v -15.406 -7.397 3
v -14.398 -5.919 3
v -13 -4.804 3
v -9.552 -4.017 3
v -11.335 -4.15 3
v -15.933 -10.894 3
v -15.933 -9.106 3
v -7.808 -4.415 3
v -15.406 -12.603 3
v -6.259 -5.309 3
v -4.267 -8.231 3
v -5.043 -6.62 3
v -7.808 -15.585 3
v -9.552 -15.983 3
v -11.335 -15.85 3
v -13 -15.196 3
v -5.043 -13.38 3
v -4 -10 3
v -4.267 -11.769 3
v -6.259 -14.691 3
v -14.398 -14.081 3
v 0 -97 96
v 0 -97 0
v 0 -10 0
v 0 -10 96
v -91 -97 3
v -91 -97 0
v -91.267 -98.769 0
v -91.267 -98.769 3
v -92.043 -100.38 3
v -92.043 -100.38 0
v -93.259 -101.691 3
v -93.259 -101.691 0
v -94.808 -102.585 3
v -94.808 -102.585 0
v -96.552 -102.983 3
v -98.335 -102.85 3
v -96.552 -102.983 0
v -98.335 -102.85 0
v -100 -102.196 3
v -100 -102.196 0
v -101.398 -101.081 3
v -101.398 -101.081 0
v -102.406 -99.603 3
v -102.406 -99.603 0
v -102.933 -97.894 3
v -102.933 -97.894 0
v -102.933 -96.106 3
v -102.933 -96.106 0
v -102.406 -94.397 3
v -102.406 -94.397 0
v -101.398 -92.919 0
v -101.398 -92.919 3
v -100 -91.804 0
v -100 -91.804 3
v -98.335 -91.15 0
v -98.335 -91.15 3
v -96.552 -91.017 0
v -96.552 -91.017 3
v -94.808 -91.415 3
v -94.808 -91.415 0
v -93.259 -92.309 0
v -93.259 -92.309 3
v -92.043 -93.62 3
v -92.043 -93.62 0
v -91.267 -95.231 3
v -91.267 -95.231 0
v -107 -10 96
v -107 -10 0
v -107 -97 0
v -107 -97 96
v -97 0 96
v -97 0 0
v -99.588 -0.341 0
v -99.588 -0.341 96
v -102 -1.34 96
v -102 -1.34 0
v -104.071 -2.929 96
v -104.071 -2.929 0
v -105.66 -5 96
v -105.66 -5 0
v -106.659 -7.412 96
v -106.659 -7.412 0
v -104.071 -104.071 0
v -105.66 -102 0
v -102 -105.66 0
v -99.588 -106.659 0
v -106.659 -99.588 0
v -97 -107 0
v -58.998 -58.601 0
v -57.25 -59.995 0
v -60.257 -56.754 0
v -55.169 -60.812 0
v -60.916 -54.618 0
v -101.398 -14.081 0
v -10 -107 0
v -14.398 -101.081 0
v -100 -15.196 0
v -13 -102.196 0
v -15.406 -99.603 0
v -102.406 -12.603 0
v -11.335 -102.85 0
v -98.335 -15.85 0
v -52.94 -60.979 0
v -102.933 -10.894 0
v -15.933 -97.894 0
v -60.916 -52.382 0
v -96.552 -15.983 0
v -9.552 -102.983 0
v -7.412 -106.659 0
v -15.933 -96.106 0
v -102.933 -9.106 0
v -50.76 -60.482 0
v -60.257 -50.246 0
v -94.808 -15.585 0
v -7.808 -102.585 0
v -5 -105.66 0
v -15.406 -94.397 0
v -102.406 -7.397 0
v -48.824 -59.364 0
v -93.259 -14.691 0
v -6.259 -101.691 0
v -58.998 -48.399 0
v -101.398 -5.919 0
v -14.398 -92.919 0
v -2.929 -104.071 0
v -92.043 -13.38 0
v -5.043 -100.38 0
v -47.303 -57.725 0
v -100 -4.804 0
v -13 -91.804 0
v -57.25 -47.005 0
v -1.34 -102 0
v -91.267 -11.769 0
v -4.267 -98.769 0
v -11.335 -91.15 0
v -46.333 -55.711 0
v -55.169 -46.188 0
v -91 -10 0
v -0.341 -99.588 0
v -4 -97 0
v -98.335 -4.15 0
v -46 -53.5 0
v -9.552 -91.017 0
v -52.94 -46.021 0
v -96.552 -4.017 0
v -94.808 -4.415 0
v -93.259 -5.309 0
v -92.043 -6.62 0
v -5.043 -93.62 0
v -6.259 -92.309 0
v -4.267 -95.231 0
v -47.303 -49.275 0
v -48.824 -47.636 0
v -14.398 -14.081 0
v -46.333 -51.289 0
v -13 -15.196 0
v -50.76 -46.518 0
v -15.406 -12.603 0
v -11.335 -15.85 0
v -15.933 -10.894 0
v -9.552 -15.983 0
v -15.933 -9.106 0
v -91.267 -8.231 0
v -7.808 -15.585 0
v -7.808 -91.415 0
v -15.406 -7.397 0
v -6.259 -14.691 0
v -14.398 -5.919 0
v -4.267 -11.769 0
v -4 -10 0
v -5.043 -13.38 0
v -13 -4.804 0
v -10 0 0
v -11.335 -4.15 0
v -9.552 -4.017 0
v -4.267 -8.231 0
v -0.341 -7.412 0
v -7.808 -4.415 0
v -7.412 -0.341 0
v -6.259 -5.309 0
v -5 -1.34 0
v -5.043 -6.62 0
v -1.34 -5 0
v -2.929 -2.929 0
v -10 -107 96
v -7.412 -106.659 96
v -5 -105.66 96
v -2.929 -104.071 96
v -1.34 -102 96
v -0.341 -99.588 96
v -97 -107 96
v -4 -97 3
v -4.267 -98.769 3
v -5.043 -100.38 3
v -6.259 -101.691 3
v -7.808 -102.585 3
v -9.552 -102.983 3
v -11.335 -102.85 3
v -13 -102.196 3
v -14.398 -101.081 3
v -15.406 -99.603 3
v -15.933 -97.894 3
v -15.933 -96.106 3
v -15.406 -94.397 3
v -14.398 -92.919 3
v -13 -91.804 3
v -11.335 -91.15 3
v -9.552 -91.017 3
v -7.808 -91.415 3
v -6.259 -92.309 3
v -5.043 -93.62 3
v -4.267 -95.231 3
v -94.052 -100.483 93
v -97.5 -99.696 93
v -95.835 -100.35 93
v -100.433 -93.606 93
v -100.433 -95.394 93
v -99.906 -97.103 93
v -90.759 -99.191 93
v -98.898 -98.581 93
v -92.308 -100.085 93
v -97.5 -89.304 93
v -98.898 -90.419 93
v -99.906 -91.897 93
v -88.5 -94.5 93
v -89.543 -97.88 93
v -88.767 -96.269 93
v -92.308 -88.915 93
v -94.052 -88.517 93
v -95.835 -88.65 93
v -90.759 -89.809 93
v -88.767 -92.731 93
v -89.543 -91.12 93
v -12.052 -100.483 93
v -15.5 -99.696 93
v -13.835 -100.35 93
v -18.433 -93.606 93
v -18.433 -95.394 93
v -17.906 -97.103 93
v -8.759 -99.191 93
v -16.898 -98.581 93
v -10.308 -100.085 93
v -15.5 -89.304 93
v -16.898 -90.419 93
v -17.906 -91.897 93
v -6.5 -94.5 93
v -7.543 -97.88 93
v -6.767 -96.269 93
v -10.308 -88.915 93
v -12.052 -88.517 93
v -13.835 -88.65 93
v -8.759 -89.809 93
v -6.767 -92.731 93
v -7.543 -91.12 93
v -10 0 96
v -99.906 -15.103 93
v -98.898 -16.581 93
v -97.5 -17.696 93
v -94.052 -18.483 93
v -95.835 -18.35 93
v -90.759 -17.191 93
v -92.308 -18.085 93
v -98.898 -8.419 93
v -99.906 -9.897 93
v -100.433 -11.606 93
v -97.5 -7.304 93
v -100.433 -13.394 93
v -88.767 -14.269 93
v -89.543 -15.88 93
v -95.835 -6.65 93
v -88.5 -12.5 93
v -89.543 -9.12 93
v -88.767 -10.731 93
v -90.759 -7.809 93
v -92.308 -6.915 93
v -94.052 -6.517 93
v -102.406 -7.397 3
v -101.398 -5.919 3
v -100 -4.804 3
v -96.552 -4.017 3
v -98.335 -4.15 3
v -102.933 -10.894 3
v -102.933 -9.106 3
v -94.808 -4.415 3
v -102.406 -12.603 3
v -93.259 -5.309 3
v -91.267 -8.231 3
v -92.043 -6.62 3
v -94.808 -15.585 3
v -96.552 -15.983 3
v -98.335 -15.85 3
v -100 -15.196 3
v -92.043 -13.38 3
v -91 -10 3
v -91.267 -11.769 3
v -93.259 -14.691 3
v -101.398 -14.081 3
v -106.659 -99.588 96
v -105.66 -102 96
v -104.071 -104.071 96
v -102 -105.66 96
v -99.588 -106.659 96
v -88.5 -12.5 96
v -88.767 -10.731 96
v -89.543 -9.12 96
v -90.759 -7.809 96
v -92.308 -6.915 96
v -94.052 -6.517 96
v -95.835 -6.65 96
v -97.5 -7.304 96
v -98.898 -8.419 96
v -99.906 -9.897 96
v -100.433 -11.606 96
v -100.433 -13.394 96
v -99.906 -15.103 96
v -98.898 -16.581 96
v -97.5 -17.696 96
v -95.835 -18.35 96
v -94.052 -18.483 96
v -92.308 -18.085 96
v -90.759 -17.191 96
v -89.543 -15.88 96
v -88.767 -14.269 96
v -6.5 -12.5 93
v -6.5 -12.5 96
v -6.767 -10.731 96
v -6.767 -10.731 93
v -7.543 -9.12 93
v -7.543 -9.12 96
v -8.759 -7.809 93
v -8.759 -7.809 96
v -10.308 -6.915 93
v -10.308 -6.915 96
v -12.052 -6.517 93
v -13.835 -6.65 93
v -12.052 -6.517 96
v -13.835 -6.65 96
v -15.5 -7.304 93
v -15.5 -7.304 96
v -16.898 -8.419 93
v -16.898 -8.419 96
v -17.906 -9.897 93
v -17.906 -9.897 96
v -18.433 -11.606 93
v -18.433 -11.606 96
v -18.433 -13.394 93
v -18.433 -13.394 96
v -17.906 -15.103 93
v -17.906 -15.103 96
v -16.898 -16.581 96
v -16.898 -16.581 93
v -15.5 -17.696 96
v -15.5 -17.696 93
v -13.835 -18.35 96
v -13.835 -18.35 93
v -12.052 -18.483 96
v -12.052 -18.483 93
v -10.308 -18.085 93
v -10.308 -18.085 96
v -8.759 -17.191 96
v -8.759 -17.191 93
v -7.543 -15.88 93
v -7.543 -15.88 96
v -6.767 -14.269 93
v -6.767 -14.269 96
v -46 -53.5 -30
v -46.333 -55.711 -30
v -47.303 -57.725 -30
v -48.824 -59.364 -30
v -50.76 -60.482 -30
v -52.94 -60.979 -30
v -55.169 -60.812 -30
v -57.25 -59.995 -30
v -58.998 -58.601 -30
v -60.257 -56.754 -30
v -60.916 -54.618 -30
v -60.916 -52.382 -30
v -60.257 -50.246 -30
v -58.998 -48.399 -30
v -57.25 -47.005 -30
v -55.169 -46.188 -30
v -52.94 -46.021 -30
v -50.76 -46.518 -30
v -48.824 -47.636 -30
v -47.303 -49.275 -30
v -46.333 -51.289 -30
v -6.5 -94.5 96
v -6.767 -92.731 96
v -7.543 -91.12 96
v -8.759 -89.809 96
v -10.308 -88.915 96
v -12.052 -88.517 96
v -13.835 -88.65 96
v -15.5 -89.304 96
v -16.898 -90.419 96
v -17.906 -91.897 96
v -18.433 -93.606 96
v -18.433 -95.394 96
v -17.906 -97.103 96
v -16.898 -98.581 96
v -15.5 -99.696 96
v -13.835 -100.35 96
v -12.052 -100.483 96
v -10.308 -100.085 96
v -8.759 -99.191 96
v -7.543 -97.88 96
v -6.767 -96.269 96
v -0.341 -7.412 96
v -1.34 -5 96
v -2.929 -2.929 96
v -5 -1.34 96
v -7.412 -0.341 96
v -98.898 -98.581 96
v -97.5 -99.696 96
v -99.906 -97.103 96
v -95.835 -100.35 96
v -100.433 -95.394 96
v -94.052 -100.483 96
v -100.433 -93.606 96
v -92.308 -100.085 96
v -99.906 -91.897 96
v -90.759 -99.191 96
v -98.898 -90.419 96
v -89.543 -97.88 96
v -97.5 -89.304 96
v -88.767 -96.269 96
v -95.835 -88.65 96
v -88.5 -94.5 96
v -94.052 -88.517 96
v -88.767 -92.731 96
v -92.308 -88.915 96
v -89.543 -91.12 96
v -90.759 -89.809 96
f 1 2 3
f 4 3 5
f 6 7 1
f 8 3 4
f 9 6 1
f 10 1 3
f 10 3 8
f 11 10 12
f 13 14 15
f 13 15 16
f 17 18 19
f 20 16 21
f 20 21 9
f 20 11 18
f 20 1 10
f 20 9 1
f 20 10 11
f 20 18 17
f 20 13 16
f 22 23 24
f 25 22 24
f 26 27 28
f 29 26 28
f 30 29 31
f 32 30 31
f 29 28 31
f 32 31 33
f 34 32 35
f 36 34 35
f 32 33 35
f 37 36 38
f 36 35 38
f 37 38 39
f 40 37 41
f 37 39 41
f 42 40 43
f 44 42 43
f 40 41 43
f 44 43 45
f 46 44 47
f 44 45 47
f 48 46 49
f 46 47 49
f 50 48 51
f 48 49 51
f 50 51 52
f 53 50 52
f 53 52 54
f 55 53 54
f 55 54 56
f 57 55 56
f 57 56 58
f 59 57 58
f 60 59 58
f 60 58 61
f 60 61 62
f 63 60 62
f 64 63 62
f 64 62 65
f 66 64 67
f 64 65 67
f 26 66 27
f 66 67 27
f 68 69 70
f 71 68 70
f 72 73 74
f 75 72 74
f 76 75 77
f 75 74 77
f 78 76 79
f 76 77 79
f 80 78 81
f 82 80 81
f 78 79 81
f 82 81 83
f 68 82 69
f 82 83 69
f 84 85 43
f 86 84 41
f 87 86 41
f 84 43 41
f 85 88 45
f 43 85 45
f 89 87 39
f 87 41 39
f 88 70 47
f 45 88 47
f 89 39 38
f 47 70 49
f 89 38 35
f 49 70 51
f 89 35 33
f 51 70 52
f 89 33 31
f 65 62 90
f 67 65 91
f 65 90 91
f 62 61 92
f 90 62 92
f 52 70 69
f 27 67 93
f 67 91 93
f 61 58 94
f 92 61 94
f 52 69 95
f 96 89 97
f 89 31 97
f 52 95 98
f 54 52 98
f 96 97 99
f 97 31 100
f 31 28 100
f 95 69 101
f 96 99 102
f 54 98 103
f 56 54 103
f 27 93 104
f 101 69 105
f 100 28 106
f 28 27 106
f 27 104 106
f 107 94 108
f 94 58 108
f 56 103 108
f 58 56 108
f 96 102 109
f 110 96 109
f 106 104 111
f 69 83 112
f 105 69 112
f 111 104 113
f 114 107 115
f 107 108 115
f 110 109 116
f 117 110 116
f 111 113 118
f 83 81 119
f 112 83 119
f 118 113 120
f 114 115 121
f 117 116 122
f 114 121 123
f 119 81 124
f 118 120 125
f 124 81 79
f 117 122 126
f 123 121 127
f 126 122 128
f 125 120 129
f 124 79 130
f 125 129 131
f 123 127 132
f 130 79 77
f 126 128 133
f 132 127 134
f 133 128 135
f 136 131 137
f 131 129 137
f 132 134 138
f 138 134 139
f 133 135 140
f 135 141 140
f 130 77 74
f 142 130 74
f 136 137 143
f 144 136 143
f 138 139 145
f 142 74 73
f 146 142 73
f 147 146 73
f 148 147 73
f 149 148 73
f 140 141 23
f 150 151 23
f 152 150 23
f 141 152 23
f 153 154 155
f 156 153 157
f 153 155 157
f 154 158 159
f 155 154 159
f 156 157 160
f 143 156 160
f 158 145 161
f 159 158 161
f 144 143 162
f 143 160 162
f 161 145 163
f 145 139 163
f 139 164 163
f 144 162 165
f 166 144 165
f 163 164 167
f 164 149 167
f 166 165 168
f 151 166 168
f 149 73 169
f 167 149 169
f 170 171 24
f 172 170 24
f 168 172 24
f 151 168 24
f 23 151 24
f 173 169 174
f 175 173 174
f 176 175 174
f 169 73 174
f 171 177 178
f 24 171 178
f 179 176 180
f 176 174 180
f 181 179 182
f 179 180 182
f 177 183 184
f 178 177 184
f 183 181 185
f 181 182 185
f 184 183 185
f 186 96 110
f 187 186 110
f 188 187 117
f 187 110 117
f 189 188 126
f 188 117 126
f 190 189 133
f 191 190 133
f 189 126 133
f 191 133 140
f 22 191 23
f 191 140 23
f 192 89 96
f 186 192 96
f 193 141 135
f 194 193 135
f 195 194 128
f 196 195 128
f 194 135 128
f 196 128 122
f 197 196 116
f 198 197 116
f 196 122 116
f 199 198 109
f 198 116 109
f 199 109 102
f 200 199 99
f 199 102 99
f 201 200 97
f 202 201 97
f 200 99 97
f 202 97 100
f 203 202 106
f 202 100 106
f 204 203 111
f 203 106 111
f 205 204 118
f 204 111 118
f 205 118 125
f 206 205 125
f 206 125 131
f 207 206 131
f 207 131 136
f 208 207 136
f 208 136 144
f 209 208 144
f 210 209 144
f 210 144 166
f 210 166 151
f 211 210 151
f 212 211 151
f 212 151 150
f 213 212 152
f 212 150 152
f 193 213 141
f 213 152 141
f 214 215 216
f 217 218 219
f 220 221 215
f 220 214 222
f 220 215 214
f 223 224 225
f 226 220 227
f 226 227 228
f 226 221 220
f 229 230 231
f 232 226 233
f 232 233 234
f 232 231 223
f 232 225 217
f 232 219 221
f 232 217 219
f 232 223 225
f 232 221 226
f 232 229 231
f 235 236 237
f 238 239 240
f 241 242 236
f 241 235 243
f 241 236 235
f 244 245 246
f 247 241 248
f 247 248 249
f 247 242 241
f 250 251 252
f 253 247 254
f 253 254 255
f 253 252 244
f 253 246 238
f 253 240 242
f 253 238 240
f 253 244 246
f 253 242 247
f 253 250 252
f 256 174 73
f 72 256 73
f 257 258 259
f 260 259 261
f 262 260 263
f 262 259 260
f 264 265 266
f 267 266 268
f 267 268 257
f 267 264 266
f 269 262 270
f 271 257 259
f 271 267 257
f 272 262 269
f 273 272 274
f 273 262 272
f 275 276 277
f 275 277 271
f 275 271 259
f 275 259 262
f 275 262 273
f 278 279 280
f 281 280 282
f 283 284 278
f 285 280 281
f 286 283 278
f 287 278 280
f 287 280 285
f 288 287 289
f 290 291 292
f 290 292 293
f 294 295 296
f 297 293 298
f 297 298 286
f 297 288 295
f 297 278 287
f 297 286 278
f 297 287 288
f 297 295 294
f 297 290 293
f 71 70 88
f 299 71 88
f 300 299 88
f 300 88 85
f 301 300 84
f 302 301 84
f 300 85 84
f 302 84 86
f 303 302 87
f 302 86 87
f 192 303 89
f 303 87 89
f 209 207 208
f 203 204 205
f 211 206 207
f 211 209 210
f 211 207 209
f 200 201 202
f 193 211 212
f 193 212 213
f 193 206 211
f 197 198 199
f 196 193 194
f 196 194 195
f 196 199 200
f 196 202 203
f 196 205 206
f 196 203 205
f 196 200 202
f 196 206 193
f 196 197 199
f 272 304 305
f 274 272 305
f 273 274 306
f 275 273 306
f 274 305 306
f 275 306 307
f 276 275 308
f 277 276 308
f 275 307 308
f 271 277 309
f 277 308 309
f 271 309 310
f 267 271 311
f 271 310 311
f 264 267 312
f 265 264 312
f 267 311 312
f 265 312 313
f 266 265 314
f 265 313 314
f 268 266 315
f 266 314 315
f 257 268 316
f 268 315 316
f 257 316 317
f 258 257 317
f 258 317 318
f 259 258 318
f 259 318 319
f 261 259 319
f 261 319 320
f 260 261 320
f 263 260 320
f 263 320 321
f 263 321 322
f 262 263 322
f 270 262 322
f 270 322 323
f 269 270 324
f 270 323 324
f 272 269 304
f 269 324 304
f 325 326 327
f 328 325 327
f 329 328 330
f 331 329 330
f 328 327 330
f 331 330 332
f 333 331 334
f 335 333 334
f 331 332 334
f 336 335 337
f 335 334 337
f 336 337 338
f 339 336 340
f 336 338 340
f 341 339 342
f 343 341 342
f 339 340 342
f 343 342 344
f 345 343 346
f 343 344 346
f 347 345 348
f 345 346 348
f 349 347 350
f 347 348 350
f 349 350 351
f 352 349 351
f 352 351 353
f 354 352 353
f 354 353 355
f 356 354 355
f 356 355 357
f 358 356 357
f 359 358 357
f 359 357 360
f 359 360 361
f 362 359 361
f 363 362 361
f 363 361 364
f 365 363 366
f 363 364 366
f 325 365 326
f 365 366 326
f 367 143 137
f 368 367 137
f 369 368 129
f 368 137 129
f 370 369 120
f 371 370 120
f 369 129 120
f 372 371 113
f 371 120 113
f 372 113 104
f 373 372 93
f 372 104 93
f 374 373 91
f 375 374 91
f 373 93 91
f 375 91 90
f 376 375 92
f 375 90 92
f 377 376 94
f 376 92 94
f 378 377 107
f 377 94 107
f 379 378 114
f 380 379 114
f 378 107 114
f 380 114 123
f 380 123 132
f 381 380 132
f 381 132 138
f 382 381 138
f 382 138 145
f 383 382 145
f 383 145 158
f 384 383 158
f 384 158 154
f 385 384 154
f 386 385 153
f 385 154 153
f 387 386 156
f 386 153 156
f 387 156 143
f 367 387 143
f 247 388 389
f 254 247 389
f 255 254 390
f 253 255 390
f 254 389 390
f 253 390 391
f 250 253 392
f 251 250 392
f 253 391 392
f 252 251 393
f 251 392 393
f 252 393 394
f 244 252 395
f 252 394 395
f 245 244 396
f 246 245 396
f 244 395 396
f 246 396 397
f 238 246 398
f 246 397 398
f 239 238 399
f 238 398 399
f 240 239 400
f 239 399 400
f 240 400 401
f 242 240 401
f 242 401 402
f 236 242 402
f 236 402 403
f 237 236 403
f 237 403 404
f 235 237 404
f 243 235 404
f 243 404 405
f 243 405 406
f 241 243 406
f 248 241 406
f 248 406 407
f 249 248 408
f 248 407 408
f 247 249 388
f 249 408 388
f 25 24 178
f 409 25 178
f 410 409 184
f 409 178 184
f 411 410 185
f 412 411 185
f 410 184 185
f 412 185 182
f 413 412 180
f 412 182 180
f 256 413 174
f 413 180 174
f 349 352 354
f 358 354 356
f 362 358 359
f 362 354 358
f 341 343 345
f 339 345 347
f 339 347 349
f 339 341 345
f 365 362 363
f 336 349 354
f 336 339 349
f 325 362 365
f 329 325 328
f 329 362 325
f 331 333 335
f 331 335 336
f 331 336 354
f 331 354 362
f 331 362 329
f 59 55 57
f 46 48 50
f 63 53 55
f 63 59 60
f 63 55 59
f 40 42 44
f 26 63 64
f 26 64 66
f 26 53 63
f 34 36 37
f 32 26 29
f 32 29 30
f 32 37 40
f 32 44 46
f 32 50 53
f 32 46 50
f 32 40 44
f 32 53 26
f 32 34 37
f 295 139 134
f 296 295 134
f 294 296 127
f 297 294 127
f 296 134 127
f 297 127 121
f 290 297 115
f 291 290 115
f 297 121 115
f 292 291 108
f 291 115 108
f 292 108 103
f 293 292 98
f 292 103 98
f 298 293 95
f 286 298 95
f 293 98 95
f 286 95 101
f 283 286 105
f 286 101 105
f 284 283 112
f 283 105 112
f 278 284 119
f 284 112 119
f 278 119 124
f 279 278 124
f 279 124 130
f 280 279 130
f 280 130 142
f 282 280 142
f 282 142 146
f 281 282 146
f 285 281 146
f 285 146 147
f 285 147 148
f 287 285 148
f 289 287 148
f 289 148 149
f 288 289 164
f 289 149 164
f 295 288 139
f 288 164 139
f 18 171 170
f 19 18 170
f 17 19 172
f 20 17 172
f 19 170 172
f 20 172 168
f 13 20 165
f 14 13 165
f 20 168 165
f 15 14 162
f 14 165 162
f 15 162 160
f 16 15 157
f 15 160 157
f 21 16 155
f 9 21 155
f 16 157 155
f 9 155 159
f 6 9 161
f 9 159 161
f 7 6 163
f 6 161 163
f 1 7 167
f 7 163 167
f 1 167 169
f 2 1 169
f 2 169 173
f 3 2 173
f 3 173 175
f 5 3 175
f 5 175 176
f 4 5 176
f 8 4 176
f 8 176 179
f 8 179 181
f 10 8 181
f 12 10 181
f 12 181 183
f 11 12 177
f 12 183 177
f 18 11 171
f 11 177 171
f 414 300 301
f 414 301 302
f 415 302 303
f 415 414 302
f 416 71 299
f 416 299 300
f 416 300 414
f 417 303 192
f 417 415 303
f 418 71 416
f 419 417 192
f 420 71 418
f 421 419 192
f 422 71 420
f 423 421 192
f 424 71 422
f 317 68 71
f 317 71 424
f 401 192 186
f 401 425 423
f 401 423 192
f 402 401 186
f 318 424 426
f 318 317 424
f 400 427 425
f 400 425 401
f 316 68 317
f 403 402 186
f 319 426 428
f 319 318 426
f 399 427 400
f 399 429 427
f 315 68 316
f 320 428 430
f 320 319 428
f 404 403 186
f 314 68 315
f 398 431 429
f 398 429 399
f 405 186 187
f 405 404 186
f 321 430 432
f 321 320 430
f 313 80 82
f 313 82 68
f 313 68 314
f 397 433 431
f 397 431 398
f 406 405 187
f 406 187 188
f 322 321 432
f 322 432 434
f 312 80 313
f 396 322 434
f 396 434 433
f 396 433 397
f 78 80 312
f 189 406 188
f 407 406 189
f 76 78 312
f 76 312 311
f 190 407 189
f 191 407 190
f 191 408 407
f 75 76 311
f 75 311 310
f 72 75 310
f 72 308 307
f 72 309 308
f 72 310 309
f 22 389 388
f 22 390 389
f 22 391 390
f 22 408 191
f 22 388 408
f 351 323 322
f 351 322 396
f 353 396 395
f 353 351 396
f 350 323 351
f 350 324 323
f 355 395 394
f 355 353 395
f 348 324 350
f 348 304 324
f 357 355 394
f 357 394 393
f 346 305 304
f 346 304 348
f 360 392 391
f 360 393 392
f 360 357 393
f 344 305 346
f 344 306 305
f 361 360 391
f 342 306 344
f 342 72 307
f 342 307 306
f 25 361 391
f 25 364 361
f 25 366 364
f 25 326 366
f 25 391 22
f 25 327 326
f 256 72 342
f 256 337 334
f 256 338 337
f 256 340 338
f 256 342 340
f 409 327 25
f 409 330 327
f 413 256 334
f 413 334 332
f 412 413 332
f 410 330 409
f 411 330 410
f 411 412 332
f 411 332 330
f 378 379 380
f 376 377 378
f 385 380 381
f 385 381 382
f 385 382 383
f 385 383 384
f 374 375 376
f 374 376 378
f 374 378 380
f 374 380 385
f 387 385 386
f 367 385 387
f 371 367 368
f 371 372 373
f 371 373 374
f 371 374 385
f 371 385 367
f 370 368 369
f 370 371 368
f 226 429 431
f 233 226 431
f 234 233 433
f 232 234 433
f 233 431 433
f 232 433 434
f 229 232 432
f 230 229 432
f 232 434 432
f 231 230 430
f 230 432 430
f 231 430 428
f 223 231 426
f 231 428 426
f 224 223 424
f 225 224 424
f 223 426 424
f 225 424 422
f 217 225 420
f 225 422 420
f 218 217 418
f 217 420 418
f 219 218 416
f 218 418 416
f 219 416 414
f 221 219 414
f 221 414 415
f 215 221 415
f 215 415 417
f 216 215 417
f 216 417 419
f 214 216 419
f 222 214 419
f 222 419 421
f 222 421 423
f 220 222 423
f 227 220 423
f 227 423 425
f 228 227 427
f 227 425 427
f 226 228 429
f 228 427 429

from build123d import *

# Parameters (mm, degrees)
F1_DEPTH = 96
F2_R     = 7.5
F3_DEPTH = 30
F4_R     = 6
F5_DEPTH = 3
F6_R     = 6
F7_DEPTH = 3


with BuildPart() as f1:
    # F0 (on Top) → F1 (new body)
    with BuildSketch(Plane.XY):
        with BuildLine():
            ThreePointArc((0, -10), (-2.928932, -2.928932), (-10, 0))
            Line((-10, 0), (-97, 0))
            ThreePointArc((-97, 0), (-104.071068, -2.928932), (-107, -10))
            Line((-107, -10), (-107, -97))
            ThreePointArc((-107, -97), (-104.071068, -104.071068), (-97, -107))
            Line((-97, -107), (-10, -107))
            ThreePointArc((-10, -107), (-2.928932, -104.071068), (0, -97))
            Line((0, -97), (0, -10))
        make_face()
    extrude(amount=F1_DEPTH)

    # F2 (on face) → F3 (join)
    with BuildSketch(Plane(origin=(0, 0, 0), x_dir=(1, 0, 0), z_dir=(0, 0, -1))):
        with Locations((-53.5, 53.5)):
            Circle(F2_R)
    extrude(amount=F3_DEPTH)

    # F4 (on face) → F5 (cut)
    with BuildSketch(Plane.XY.offset(96)):
        with Locations((-94.5, -94.5)):
            Circle(F4_R)
        with Locations((-94.5, -12.5)):
            Circle(F4_R)
        with Locations((-12.5, -94.5)):
            Circle(F4_R)
        with Locations((-12.5, -12.5)):
            Circle(F4_R)
    extrude(amount=-F5_DEPTH, mode=Mode.SUBTRACT)

    # F6 (on face) → F7 (cut)
    with BuildSketch(Plane(origin=(0, 0, 0), x_dir=(1, 0, 0), z_dir=(0, 0, -1))):
        with Locations((-10, 97)):
            Circle(F6_R)
        with Locations((-10, 10)):
            Circle(F6_R)
        with Locations((-97, 97)):
            Circle(F6_R)
        with Locations((-97, 10)):
            Circle(F6_R)
    extrude(amount=-F7_DEPTH, mode=Mode.SUBTRACT)


solid = f1.part
